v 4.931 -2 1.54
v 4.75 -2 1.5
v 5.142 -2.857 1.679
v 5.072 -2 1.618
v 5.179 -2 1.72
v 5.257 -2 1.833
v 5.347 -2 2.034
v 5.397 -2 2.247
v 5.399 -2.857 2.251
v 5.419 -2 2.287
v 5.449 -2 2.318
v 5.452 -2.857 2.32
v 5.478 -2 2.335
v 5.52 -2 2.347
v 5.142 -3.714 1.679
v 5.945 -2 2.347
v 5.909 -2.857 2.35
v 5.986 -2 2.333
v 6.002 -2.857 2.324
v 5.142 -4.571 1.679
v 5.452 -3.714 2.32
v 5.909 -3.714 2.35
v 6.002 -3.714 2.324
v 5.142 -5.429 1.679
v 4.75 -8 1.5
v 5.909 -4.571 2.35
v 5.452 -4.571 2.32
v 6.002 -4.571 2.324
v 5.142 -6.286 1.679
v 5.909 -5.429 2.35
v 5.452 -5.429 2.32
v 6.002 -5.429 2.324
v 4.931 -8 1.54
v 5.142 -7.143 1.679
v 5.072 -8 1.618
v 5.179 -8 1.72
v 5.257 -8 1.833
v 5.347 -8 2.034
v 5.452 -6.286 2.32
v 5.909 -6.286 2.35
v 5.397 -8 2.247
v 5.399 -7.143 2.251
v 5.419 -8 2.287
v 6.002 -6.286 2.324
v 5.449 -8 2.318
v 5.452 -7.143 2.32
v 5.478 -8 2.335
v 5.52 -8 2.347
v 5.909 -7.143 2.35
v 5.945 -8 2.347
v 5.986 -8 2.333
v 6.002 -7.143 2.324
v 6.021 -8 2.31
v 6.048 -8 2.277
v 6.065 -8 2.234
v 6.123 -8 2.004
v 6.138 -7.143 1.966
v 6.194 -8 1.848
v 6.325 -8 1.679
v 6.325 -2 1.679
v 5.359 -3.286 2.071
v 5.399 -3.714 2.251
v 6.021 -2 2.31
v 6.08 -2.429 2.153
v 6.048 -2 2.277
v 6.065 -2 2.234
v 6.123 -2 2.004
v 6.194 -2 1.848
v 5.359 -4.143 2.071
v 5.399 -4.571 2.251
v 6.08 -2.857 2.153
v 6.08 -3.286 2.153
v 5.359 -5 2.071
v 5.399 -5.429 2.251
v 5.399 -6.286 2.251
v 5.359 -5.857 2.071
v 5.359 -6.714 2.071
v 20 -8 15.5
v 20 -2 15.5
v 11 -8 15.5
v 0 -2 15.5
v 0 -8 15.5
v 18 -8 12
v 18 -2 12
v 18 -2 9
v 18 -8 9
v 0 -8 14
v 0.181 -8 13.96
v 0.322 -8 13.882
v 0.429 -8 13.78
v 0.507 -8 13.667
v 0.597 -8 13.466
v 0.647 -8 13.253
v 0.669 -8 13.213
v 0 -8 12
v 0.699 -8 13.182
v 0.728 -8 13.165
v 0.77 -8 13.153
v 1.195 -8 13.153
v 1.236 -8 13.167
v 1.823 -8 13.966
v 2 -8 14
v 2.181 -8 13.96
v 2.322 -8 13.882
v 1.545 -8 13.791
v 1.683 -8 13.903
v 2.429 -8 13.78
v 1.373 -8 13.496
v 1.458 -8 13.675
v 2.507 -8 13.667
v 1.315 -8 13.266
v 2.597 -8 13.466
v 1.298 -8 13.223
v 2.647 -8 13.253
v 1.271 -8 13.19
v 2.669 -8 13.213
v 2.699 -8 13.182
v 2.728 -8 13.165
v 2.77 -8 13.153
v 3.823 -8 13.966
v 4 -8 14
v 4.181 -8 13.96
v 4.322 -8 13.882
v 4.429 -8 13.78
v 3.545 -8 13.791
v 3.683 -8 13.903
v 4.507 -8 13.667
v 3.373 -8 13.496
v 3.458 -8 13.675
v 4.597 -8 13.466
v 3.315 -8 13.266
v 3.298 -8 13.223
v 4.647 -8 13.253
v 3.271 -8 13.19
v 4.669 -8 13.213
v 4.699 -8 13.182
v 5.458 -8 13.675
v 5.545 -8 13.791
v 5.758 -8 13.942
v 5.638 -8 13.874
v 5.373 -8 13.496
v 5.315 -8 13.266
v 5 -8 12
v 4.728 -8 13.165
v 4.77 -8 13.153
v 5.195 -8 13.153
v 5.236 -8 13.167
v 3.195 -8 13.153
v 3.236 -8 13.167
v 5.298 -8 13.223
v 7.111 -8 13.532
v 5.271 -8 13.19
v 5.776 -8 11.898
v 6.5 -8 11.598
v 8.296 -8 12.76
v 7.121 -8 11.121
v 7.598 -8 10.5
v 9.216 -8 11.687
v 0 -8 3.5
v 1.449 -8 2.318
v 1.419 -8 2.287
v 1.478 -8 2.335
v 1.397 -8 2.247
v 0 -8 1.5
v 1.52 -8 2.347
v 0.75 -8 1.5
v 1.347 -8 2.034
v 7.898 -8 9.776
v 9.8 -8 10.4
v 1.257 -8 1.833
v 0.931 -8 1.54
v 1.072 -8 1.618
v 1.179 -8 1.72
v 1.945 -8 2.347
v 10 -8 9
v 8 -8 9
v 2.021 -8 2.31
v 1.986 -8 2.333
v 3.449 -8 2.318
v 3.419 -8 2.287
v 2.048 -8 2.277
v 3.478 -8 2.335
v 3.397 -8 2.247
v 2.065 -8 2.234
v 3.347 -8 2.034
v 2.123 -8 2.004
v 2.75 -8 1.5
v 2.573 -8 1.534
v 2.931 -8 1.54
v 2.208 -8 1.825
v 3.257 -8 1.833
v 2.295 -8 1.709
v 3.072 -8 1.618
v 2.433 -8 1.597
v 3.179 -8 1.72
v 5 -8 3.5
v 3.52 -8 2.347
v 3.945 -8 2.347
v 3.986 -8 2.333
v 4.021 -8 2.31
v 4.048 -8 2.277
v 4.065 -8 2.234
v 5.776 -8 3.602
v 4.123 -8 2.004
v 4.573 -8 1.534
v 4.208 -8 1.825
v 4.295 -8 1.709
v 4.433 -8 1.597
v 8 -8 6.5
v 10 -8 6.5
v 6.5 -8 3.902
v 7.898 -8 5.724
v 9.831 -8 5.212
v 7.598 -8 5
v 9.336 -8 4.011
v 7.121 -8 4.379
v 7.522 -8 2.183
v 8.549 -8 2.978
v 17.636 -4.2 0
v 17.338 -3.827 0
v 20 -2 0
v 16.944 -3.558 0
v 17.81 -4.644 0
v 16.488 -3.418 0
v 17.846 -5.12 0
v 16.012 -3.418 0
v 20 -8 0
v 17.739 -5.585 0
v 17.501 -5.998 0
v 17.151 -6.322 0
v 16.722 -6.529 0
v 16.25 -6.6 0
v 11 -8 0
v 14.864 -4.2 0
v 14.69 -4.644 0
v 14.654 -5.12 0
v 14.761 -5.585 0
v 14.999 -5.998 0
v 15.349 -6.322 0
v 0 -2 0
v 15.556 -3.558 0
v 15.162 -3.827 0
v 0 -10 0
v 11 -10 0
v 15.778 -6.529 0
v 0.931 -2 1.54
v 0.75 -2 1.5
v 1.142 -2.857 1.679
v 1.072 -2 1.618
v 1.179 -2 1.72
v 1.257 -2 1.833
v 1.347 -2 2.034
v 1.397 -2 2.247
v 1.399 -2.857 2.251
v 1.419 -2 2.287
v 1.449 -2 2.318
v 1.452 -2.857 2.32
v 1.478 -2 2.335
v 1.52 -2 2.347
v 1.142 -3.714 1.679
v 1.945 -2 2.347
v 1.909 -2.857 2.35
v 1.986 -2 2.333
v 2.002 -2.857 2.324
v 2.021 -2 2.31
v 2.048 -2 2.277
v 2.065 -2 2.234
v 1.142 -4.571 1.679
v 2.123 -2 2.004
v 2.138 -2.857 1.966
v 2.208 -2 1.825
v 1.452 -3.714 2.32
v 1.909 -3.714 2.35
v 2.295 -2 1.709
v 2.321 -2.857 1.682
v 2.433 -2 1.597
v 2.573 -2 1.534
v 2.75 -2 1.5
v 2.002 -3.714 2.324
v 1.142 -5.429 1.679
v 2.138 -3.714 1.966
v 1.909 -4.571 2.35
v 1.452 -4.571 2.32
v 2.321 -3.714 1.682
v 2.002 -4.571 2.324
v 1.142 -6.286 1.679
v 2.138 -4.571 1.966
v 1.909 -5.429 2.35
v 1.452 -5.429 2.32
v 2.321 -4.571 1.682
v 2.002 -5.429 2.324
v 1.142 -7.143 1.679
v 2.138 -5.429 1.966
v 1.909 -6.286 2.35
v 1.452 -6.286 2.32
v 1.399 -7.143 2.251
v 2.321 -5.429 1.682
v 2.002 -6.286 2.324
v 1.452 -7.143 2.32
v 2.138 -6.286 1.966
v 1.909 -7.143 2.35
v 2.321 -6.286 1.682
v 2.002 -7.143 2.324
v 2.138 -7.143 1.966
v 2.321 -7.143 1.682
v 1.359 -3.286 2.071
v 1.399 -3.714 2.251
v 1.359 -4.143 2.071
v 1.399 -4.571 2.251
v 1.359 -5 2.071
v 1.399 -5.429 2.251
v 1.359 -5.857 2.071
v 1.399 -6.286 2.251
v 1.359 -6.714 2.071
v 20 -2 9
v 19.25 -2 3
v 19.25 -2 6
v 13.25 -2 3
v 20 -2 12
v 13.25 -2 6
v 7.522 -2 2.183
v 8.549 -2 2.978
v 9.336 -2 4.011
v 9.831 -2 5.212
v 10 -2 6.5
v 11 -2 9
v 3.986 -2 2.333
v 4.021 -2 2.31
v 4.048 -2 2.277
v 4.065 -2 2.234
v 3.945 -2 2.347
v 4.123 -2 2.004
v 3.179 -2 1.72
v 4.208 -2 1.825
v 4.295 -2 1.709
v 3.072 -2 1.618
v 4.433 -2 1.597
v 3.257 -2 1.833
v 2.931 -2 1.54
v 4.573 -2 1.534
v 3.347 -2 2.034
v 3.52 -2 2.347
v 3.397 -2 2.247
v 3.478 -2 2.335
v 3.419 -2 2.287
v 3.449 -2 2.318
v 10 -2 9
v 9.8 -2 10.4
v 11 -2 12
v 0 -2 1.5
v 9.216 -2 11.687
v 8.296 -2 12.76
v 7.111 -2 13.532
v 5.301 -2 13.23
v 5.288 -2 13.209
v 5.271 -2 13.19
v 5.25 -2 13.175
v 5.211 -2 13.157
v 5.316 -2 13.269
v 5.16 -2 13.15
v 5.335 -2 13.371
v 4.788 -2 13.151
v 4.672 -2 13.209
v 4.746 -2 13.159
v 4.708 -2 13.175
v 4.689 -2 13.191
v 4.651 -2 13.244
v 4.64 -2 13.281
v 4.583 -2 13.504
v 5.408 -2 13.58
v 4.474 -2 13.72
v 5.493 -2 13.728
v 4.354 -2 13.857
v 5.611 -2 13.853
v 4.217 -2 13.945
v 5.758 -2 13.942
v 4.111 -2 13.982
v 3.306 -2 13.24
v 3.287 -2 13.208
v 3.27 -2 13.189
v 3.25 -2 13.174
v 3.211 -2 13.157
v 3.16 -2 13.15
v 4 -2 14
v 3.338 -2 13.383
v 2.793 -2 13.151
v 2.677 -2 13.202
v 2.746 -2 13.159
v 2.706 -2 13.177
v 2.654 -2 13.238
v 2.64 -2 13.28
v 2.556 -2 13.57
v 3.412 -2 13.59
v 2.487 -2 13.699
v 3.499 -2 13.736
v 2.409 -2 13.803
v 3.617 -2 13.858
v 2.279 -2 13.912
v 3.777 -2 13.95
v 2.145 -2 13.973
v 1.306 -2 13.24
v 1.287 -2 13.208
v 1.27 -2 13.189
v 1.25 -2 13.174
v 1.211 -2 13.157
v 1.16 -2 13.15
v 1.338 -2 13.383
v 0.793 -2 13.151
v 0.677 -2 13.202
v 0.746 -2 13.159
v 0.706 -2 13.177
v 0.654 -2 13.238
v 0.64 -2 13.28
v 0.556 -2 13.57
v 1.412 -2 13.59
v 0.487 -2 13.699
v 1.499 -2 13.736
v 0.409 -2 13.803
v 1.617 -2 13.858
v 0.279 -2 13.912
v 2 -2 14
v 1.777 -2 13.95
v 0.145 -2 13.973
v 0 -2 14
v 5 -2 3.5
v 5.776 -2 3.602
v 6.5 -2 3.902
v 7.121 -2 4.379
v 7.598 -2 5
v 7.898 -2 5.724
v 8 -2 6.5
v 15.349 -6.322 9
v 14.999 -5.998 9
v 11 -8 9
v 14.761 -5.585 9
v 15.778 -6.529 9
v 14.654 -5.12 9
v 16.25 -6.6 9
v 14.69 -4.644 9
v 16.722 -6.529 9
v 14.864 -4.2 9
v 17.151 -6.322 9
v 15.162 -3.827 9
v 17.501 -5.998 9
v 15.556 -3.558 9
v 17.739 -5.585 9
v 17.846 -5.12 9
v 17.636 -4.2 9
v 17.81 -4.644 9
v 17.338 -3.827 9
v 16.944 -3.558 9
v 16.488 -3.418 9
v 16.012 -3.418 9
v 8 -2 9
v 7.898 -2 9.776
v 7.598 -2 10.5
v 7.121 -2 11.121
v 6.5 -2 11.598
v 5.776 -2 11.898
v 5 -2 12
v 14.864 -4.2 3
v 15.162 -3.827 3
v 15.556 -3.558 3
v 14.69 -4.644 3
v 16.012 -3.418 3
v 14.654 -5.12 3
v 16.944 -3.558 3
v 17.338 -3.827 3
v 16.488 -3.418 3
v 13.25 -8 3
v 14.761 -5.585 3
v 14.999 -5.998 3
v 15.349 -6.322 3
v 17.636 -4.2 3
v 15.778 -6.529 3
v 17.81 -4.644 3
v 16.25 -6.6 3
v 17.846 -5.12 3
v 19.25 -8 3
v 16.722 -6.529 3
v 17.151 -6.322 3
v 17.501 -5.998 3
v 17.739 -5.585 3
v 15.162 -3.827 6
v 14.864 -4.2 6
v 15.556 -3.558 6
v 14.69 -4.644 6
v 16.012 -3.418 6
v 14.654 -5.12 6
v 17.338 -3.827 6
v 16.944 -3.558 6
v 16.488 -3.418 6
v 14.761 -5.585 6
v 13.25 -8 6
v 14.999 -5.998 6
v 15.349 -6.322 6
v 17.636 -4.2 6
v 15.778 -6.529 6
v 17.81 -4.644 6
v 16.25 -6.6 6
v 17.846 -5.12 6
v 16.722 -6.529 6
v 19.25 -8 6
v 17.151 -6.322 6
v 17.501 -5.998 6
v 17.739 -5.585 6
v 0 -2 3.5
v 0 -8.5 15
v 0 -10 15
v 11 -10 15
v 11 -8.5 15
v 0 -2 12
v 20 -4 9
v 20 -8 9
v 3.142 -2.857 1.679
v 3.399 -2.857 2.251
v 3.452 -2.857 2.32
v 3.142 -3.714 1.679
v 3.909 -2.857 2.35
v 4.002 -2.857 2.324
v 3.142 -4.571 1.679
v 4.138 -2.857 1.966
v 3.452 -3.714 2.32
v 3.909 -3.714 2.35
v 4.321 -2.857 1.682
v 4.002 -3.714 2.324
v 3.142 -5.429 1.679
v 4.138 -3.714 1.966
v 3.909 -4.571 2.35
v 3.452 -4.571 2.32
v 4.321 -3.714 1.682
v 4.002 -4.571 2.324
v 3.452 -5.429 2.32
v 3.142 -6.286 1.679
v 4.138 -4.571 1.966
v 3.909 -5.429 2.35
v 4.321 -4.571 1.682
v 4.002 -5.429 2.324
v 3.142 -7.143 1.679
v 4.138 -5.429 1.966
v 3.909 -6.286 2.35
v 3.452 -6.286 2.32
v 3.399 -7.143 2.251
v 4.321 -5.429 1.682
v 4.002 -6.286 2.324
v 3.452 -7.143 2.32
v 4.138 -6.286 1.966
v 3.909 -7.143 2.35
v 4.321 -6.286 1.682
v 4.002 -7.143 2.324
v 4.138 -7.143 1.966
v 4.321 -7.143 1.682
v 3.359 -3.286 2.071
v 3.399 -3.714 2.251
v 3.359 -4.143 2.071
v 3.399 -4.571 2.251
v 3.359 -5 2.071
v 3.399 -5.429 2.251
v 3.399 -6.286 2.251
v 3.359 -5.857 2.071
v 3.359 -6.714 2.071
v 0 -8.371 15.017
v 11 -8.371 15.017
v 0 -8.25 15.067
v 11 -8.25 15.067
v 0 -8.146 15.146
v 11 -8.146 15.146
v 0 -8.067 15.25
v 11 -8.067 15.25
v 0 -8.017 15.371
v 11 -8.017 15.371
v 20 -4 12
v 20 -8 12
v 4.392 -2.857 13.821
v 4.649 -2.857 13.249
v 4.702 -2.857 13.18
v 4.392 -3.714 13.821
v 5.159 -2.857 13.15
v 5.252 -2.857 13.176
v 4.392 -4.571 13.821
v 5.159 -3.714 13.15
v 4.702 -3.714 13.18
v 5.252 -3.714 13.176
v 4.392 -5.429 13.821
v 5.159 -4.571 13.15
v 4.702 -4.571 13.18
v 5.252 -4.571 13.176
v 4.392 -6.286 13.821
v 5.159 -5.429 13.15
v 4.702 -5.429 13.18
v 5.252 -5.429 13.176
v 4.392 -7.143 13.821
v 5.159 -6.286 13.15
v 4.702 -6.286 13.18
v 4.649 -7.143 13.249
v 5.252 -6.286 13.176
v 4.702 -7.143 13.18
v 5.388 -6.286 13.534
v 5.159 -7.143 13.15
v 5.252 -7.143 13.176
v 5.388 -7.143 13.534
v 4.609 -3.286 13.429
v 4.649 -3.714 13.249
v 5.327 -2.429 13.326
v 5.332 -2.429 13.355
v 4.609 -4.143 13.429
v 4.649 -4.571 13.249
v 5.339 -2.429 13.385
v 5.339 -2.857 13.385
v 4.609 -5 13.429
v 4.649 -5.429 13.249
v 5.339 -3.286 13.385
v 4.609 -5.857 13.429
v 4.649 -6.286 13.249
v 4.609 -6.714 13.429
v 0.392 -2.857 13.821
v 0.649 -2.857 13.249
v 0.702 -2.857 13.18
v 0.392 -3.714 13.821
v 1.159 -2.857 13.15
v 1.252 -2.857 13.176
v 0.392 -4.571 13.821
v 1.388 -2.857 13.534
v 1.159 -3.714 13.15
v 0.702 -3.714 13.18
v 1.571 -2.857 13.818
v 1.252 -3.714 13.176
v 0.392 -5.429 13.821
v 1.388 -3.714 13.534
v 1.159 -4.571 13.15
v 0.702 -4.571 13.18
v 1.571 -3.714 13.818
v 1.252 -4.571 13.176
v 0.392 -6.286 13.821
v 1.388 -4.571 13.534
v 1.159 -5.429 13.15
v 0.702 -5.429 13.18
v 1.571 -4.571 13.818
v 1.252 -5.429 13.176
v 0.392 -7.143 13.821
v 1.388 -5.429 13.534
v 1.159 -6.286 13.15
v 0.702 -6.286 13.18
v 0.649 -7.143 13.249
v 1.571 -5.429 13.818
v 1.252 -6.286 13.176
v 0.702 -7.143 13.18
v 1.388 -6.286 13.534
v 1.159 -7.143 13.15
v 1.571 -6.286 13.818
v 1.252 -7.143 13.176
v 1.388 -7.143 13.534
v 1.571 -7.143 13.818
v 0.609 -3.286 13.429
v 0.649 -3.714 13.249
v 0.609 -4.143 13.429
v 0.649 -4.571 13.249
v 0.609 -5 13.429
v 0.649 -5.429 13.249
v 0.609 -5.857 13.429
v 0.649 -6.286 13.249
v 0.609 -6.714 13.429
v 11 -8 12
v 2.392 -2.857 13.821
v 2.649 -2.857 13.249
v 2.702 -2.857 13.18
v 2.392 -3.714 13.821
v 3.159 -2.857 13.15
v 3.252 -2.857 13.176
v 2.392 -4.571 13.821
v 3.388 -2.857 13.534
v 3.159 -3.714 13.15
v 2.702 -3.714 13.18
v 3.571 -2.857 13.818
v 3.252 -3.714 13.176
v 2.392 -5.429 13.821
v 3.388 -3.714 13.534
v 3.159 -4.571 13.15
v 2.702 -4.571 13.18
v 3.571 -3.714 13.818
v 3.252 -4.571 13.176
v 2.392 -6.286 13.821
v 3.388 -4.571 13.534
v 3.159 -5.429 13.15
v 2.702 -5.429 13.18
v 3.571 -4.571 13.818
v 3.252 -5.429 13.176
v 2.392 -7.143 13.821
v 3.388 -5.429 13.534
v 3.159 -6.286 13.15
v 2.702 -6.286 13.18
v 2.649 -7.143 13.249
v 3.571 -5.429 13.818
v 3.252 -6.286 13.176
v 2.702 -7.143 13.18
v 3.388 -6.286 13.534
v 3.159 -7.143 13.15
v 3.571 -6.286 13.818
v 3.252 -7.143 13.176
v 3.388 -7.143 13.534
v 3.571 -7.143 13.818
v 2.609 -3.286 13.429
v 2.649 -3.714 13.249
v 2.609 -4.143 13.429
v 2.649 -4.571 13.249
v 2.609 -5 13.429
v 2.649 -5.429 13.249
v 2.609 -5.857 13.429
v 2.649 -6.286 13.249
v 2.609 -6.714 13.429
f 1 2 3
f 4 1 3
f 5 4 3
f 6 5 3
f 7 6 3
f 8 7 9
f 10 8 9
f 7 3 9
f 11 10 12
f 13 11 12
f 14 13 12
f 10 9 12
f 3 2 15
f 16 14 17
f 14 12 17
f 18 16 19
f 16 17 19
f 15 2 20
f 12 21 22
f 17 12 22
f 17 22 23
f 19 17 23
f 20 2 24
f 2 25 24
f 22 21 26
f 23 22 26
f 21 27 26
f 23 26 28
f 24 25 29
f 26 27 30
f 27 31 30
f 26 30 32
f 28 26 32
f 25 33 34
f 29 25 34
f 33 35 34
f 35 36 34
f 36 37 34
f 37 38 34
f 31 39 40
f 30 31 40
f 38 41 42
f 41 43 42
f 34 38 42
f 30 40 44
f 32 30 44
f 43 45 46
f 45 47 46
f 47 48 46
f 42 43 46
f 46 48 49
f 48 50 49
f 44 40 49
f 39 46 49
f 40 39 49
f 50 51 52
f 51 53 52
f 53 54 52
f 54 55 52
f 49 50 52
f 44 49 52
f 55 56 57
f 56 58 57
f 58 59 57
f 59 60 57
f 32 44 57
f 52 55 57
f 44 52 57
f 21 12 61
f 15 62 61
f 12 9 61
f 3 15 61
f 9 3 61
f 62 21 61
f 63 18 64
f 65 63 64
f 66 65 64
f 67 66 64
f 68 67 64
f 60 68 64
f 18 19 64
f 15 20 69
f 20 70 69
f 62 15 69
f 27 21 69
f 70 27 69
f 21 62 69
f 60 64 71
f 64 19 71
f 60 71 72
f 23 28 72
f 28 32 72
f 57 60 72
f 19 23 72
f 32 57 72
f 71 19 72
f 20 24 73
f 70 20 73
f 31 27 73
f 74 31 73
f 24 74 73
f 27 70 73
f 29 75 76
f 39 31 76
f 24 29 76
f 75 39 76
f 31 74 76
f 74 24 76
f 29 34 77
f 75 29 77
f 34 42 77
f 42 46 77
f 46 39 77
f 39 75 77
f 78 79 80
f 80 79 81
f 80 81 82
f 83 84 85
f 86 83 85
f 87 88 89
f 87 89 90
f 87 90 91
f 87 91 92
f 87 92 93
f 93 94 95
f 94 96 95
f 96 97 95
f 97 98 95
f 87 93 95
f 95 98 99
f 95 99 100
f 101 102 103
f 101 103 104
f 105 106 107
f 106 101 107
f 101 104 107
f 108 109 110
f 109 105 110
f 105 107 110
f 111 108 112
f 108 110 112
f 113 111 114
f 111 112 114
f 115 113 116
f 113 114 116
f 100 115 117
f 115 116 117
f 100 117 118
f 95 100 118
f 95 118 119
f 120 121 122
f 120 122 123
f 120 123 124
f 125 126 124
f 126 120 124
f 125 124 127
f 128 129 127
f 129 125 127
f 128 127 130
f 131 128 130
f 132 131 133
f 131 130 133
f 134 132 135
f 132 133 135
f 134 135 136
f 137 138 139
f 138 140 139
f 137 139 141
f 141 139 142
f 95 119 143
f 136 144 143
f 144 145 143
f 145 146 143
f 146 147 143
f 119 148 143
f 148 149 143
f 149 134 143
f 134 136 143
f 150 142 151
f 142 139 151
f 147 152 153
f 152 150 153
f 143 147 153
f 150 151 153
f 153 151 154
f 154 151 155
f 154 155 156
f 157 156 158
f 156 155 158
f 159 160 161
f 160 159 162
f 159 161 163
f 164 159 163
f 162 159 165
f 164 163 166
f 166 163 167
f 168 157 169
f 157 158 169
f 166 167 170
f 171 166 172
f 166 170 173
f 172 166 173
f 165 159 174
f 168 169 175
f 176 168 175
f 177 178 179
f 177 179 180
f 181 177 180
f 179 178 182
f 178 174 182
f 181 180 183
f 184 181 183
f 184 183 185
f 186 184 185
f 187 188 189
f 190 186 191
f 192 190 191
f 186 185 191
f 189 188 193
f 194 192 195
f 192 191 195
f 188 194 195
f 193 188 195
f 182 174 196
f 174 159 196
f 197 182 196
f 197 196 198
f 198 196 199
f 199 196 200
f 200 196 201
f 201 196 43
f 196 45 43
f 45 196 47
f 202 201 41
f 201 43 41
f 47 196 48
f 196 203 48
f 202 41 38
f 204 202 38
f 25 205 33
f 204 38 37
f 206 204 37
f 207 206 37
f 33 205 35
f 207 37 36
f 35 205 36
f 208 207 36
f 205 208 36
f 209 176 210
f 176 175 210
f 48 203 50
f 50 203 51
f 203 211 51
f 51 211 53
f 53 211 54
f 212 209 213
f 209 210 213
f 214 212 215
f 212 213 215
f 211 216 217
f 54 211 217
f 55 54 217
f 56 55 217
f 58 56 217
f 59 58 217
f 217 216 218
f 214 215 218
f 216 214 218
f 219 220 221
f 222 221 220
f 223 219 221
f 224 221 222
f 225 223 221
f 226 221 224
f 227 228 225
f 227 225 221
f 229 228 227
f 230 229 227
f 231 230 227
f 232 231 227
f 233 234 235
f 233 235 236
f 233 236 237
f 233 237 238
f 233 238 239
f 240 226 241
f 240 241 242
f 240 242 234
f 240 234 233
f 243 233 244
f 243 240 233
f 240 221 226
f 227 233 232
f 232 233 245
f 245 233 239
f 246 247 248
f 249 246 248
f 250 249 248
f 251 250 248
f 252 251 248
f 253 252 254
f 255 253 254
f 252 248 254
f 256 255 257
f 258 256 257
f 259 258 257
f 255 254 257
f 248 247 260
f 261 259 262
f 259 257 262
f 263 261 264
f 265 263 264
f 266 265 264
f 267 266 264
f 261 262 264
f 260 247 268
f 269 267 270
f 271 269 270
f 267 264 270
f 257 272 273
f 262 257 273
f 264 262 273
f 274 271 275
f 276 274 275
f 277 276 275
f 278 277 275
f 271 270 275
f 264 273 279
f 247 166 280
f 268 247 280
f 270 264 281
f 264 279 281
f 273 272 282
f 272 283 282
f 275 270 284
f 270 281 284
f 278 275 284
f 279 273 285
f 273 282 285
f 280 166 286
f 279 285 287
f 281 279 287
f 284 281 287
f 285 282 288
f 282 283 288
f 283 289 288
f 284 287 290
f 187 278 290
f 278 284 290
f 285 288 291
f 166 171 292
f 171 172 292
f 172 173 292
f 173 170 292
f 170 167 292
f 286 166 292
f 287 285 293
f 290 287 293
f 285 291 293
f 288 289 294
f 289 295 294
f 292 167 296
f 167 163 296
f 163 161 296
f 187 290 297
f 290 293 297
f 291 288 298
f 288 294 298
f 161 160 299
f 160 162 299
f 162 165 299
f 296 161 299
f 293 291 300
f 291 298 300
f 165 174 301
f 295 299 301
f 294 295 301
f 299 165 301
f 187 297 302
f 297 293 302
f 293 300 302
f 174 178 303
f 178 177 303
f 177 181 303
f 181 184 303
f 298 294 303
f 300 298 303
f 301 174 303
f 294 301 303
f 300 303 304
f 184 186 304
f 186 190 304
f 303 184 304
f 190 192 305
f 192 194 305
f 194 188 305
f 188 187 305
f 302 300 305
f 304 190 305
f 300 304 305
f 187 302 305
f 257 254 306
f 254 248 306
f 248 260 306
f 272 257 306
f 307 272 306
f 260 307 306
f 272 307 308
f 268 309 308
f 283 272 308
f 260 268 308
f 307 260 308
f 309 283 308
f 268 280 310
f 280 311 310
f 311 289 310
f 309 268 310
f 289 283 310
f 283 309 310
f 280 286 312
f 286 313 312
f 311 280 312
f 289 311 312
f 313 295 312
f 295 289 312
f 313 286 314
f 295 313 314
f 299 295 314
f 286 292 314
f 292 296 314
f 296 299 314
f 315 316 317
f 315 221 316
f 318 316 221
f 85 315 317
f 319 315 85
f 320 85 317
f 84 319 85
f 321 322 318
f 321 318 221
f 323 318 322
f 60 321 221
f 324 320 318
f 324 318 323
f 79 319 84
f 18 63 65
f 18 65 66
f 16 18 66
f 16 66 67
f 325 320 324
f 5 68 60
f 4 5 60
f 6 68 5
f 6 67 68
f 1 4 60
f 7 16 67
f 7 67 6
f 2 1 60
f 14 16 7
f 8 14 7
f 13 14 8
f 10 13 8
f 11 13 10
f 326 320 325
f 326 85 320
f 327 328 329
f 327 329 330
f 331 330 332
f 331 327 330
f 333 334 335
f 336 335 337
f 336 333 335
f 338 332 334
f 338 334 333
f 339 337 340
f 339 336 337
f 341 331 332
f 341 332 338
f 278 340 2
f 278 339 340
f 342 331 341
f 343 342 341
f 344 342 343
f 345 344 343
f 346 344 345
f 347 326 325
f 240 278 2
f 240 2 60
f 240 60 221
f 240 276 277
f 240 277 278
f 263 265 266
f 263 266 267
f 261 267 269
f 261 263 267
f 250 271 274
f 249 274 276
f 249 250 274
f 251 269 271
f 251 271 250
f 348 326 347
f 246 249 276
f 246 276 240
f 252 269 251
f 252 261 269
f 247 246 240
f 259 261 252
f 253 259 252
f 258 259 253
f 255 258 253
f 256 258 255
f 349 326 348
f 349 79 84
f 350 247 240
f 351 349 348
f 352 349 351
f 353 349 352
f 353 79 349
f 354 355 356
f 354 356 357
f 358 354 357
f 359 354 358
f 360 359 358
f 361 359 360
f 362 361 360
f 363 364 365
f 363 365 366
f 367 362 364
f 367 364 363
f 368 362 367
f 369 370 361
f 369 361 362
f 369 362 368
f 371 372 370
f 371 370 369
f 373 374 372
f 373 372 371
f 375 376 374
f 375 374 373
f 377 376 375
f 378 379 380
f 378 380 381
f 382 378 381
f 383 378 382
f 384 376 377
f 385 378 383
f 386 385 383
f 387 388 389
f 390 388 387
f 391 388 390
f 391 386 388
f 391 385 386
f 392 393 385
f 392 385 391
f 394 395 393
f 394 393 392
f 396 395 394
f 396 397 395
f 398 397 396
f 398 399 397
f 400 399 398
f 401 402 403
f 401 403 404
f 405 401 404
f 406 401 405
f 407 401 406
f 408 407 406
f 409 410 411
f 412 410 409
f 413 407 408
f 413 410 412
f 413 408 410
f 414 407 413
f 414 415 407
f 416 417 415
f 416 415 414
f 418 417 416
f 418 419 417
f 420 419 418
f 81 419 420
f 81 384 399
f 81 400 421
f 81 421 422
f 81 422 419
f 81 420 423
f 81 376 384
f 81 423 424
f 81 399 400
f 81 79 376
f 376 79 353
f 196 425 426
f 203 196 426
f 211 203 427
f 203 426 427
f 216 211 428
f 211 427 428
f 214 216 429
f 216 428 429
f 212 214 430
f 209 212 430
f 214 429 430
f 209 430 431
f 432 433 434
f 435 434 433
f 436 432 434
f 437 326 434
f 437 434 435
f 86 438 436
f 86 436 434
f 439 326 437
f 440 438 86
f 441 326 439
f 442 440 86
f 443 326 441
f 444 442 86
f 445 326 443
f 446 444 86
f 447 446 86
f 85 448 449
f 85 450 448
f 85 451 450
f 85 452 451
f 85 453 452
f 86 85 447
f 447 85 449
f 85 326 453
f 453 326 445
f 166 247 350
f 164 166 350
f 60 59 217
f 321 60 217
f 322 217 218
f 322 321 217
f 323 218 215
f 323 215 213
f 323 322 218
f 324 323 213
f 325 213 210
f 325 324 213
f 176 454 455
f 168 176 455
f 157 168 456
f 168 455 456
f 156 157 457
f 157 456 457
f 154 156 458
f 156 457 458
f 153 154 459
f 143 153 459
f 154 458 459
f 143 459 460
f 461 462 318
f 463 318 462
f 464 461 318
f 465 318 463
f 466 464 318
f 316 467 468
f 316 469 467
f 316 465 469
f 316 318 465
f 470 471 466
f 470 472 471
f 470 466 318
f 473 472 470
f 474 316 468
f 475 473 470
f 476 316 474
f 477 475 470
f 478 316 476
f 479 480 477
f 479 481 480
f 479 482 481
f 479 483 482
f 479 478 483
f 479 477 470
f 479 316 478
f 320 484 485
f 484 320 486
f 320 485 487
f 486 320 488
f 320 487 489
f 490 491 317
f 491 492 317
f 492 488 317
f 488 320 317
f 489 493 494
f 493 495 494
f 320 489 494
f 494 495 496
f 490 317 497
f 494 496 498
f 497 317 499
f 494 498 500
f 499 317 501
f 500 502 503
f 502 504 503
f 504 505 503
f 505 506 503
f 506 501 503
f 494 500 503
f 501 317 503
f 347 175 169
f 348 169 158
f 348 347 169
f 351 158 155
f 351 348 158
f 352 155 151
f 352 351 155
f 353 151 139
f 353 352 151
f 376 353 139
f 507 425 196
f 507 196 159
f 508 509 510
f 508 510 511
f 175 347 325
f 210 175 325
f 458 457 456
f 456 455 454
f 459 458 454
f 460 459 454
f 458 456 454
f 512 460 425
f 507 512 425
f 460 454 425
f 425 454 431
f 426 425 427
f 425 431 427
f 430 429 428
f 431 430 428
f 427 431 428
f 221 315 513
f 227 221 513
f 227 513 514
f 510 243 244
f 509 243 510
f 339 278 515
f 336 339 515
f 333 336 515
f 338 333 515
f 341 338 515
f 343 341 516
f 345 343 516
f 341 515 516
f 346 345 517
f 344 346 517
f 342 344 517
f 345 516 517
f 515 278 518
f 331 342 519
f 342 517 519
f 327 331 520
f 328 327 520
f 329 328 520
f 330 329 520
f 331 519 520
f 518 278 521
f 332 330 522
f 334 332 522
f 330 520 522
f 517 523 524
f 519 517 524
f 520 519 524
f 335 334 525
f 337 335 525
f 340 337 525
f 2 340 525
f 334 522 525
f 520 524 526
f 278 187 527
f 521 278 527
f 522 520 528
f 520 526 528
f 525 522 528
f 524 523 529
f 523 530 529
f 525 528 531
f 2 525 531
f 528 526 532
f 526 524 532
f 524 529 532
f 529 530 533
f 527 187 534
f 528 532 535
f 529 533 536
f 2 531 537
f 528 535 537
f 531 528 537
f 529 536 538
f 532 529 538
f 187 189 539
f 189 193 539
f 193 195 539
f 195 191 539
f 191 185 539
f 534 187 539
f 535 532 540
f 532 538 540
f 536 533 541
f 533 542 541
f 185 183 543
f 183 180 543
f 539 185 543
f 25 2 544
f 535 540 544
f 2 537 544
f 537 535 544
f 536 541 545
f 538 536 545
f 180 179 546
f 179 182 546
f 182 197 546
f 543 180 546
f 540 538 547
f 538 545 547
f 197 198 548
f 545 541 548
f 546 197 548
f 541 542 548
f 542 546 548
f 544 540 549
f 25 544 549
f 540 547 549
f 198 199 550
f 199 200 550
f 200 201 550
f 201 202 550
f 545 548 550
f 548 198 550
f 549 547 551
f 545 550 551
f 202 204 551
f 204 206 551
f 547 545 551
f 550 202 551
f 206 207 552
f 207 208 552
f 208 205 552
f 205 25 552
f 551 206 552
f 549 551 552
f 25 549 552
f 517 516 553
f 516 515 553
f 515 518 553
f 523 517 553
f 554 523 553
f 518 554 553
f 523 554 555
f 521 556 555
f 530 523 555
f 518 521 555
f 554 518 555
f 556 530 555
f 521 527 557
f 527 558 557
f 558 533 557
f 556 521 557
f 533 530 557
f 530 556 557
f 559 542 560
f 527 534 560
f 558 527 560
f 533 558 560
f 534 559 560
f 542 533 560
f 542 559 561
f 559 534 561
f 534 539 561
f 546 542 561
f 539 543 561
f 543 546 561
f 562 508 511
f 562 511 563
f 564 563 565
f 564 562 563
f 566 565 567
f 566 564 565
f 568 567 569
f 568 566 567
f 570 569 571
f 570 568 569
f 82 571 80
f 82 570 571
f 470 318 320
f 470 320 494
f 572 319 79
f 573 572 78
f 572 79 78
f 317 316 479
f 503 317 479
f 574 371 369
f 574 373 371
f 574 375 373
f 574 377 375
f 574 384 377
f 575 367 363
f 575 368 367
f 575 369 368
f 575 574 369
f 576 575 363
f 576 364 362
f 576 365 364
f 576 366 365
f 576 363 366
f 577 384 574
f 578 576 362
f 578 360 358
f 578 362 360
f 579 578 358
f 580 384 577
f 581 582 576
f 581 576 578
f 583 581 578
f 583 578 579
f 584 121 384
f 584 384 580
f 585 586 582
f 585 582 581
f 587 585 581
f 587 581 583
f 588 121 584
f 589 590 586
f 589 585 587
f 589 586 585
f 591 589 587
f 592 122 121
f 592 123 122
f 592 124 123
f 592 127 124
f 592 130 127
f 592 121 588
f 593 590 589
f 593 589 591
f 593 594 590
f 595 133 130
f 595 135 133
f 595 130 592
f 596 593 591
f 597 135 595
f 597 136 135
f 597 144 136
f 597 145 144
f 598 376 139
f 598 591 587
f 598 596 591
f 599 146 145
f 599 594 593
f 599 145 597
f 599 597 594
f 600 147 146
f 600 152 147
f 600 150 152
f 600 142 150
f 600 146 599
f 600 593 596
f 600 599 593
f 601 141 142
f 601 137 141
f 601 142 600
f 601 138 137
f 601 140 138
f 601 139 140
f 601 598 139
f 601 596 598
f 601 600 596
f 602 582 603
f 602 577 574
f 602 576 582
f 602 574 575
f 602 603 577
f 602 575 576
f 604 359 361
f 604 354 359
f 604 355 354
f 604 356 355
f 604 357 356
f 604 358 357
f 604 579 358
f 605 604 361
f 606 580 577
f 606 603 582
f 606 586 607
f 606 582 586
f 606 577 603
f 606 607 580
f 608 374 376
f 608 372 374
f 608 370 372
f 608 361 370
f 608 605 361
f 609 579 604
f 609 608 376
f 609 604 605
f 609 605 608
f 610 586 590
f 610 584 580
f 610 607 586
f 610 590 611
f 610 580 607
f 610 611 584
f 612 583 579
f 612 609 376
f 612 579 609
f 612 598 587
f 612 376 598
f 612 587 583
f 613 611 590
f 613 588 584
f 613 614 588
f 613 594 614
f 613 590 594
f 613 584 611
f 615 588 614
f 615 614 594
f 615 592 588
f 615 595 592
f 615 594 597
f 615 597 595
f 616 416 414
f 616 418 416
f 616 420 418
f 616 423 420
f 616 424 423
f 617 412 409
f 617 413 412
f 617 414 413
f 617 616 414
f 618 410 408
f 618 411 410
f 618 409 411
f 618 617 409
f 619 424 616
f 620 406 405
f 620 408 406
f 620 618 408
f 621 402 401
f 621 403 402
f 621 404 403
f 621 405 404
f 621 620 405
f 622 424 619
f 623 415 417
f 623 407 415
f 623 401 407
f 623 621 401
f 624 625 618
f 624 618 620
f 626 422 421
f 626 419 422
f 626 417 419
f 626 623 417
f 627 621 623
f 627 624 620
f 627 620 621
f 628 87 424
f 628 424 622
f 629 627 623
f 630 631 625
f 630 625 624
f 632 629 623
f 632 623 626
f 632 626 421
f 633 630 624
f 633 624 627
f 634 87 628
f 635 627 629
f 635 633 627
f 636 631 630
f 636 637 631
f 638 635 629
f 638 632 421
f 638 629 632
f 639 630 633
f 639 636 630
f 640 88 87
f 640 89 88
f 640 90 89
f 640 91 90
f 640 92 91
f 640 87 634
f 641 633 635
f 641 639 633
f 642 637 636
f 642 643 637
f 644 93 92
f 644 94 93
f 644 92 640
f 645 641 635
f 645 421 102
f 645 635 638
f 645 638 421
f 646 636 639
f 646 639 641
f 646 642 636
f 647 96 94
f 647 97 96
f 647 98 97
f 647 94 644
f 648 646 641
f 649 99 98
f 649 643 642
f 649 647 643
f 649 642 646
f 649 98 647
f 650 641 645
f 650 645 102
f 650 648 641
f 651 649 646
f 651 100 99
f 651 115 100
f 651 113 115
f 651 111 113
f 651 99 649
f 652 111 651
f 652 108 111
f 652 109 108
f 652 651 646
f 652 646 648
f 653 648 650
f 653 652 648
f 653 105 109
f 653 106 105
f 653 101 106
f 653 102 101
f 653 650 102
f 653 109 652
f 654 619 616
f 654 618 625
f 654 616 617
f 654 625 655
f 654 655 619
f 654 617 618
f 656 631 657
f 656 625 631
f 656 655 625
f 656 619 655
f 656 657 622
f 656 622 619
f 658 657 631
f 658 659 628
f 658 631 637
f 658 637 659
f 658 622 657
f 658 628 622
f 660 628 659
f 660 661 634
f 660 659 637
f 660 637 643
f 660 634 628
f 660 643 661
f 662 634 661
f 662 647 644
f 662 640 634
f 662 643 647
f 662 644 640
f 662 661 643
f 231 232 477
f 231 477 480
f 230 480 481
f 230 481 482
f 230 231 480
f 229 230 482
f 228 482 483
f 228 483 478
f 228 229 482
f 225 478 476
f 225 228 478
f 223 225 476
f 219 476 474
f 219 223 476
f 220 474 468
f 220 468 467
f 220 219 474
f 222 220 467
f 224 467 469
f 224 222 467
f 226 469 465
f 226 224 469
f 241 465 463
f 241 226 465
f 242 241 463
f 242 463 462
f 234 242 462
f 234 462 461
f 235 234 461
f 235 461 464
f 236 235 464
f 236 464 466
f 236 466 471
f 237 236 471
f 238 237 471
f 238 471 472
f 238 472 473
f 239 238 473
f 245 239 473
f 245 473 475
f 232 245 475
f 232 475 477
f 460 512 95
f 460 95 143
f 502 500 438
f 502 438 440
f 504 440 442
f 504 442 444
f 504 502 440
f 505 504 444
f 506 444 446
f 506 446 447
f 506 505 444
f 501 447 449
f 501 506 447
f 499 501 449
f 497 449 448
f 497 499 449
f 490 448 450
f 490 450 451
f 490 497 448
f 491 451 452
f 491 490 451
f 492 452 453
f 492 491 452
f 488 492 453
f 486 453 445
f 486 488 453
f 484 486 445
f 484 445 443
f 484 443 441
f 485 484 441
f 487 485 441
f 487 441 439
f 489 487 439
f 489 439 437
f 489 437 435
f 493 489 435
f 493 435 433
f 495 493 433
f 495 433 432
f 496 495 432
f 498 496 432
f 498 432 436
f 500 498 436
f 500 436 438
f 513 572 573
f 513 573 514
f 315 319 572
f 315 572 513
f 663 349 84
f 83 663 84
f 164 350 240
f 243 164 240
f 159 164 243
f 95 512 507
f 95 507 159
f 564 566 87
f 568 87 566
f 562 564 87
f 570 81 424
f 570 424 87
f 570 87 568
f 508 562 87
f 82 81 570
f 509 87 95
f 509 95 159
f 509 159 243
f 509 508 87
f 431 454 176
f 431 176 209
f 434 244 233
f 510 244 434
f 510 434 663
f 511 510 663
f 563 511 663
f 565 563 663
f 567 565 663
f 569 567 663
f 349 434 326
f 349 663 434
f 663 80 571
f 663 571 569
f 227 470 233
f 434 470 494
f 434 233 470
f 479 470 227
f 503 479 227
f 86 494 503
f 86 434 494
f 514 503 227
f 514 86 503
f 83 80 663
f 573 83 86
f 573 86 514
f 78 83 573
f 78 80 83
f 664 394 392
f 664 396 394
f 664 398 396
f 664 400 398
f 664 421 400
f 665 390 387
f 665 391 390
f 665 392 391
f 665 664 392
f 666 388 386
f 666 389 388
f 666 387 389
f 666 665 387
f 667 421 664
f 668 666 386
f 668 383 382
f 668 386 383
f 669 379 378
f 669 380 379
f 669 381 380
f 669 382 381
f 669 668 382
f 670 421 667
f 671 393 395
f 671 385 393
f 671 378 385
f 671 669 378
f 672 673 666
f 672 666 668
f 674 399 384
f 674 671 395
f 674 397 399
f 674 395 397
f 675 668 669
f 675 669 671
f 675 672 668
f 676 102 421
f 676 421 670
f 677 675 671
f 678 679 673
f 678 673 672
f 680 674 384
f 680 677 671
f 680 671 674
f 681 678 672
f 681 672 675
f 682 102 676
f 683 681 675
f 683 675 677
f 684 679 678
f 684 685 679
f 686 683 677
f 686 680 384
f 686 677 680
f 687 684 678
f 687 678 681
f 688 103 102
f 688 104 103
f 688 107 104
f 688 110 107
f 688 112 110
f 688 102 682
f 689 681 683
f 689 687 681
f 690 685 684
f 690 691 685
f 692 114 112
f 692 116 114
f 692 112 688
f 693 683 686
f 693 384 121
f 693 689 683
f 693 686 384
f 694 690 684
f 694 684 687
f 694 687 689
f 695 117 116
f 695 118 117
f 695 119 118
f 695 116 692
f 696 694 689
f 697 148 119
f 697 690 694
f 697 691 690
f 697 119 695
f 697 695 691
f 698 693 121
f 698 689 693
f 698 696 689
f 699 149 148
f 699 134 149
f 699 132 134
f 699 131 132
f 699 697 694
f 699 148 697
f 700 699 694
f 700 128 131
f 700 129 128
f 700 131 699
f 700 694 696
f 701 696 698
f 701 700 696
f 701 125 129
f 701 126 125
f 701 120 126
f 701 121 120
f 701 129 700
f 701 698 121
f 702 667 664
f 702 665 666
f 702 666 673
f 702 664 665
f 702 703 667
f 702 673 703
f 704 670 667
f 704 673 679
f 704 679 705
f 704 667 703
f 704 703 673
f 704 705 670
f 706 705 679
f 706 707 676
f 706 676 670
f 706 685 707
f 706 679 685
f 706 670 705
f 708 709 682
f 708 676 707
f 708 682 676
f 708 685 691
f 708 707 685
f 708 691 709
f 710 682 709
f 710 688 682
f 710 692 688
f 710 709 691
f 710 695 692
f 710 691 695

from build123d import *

# Parameters (mm, degrees)
SKETCH_W        = 10
SKETCH_H        = 15.5
PAD_DEPTH       = 20
POCKET001_DEPTH = 20.001
SKETCH003_W     = 3
SKETCH003_H     = 7
SKETCH003_H_2   = 1.990637
POCKET002_DEPTH = 10.001
SKETCH004_W     = 2
SKETCH004_H     = 9
POCKET003_DEPTH = 15.501
SKETCH005_W     = 2
SKETCH005_H     = 9
POCKET004_DEPTH = 15.501
POCKET005_DEPTH = 8
PAD001_DEPTH    = 8
SKETCH010_R     = 1.6
POCKET006_DEPTH = 10
SKETCH013_W     = 2
SKETCH013_H     = 20
POCKET008_DEPTH = 11.001
SKETCH014_W     = 6
SKETCH014_H     = 6
POCKET009_DEPTH = 3
PAD002_DEPTH    = 6


with BuildPart() as framebase:
    # Sketch → Pad (new body)
    with BuildSketch(Plane.YZ):
        with Locations((5, 7.75)):
            Rectangle(SKETCH_W, SKETCH_H)
    extrude(amount=PAD_DEPTH)

    # Sketch002 (on DatumPlane) → Pocket001 (cut, through all)
    with BuildSketch(Plane(origin=(0, 10, 15.5), x_dir=(0, 1, 0), z_dir=(-1, 0, 0))):
        with BuildLine():
            ThreePointArc((0, -0.5), (0.5, 0), (0, 0.5))
            Line((0, 0.5), (-1.5, 0.5))
            ThreePointArc((-1.5, 0.5), (-2, 0), (-1.5, -0.5))
            Line((0, -0.5), (-1.5, -0.5))
        make_face()
    extrude(amount=-POCKET001_DEPTH, mode=Mode.SUBTRACT)

    # Sketch003 (on DatumPlane) → Pocket002 (cut, through all)
    with BuildSketch(Plane(origin=(20, 0, 15.5), x_dir=(0, 0, -1), z_dir=(0, -1, 0))):
        with Locations((5, -5.5)):
            Rectangle(SKETCH003_W, SKETCH003_H)
        with Locations((5, 0.995318)):
            Rectangle(SKETCH003_W, SKETCH003_H_2)
    extrude(amount=-POCKET002_DEPTH, mode=Mode.SUBTRACT)

    # Sketch004 (on DatumPlane) → Pocket003 (cut, through all)
    with BuildSketch(Plane(origin=(20, 0, 15.5), x_dir=(0, -1, 0), z_dir=(0, 0, 1))):
        with Locations((-1, -4.5)):
            Rectangle(SKETCH004_W, SKETCH004_H)
    extrude(amount=-POCKET003_DEPTH, mode=Mode.SUBTRACT)

    # Sketch005 (on DatumPlane) → Pocket004 (cut, through all)
    with BuildSketch(Plane(origin=(20, 10, 15.5), x_dir=(0, -1, 0), z_dir=(0, 0, 1))):
        with Locations((1, -4.5)):
            Rectangle(SKETCH005_W, SKETCH005_H)
    extrude(amount=-POCKET004_DEPTH, mode=Mode.SUBTRACT)

    # Sketch006 (on DatumPlane) → Pocket005 (cut)
    with BuildSketch(Plane(origin=(0, 0, 15.5), x_dir=(0, 0, -1), z_dir=(0, -1, 0))):
        with BuildLine():
            Line((1.5, 0), (3.5, 0))
            Line((3.5, 0), (3.5, 5))
            ThreePointArc((6.5, 8), (4.37868, 7.12132), (3.5, 5))
            Line((6.5, 8), (9, 8))
            ThreePointArc((12, 5), (11.12132, 7.12132), (9, 8))
            Line((12, 5), (12, 0))
            Line((12, 0), (14, 0))
            Line((14, 5), (14, 0))
            ThreePointArc((14, 5), (12.535534, 8.535534), (9, 10))
            Line((6.5, 10), (9, 10))
            ThreePointArc((6.5, 10), (2.964466, 8.535534), (1.5, 5))
            Line((1.5, 5), (1.5, 0))
        make_face()
    extrude(amount=-POCKET005_DEPTH, mode=Mode.SUBTRACT)

    # Sketch008 (on DatumPlane) → Pad001 (join)
    with BuildSketch(Plane(origin=(0, 8, 14), x_dir=(1, 0, 0), z_dir=(0, -1, 0))):
        with BuildLine():
            add(Edge.make_bspline(
                [(0, 0), (0.35359, -0.026741), (0.649381, -0.565336), (0.617792, -0.761919), (0.721021, -0.848783), (0.871627, -0.848783), (1.086099, -0.848783), (1.231939, -0.850694), (1.339653, -0.771577), (1.309148, -0.564354), (1.603926, -0.032231), (2, 0)],
                knots=[0, 0, 0, 0, 0.142857, 0.285714, 0.428571, 0.428571, 0.571429, 0.571429, 0.714286, 0.857143, 1, 1, 1, 1], degree=3))
            add(Edge.make_bspline(
                [(2, 0), (2.35359, -0.026741), (2.649381, -0.565336), (2.617792, -0.761919), (2.721021, -0.848783), (2.871627, -0.848783), (3.086099, -0.848783), (3.231939, -0.850694), (3.339653, -0.771577), (3.309148, -0.564354), (3.603926, -0.032231), (4, 0)],
                knots=[0, 0, 0, 0, 0.142857, 0.285714, 0.428571, 0.428571, 0.571429, 0.571429, 0.714286, 0.857143, 1, 1, 1, 1], degree=3))
            add(Edge.make_bspline(
                [(4, 0), (4.35359, -0.026741), (4.649381, -0.565336), (4.617792, -0.761919), (4.721021, -0.848783), (4.871627, -0.848783), (5.086099, -0.848783), (5.231939, -0.850694), (5.339653, -0.771577), (5.309148, -0.564354), (5.603926, -0.032231), (6, 0)],
                knots=[0, 0, 0, 0, 0.142857, 0.285714, 0.428571, 0.428571, 0.571429, 0.571429, 0.714286, 0.857143, 1, 1, 1, 1], degree=3))
            Line((6, 0), (6, 1))
            Line((6, 1), (0, 1))
            Line((0, 1), (0, 0))
        make_face()
    extrude(amount=PAD001_DEPTH)

    # Sketch010 (on DatumPlane) → Pocket006 (cut)
    with BuildSketch(Plane(origin=(20, 0, 0), x_dir=(0, 1, 0), z_dir=(0, 0, -1))):
        with Locations((5, -3.75)):
            Circle(SKETCH010_R)
    extrude(amount=-POCKET006_DEPTH, mode=Mode.SUBTRACT)

    # Sketch013 (on DatumPlane) → Pocket008 (cut, through all)
    with BuildSketch(Plane(origin=(11, 2, 15.5), x_dir=(0, -1, 0), z_dir=(1, 0, 0))):
        with Locations((1, 10)):
            Rectangle(SKETCH013_W, SKETCH013_H)
    extrude(amount=-POCKET008_DEPTH, mode=Mode.SUBTRACT)

    # Sketch014 (on DatumPlane) → Pocket009 (cut)
    with BuildSketch(Plane(origin=(20, 0, 3), x_dir=(0, 1, 0), z_dir=(0, 0, -1))):
        with Locations((5, -3.75)):
            Rectangle(SKETCH014_W, SKETCH014_H)
    extrude(amount=-POCKET009_DEPTH, mode=Mode.SUBTRACT)

    # Sketch012 (on DatumPlane) → Pad002 (join)
    with BuildSketch(Plane(origin=(0, 8, 1.5), x_dir=(1, 0, 0), z_dir=(0, -1, 0))):
        with BuildLine():
            add(Edge.make_bspline(
                [(0.75, 0), (1.10359, 0.026741), (1.399381, 0.565336), (1.367792, 0.761919), (1.471021, 0.848783), (1.621627, 0.848783), (1.836099, 0.848783), (1.981939, 0.850694), (2.089653, 0.771577), (2.059148, 0.564354), (2.353926, 0.032231), (2.75, 0)],
                knots=[0, 0, 0, 0, 0.142857, 0.285714, 0.428571, 0.428571, 0.571429, 0.571429, 0.714286, 0.857143, 1, 1, 1, 1], degree=3))
            Line((0.75, 0), (0, 0))
            Line((0, 0), (0, -1))
            Line((0, -1), (6.75, -1))
            Line((6.75, -1), (6.75, 0))
            add(Edge.make_bspline(
                [(4.75, 0), (5.10359, 0.026741), (5.399381, 0.565336), (5.367792, 0.761919), (5.471021, 0.848783), (5.621627, 0.848783), (5.836099, 0.848783), (5.981939, 0.850694), (6.089653, 0.771577), (6.059148, 0.564354), (6.353926, 0.032231), (6.75, 0)],
                knots=[0, 0, 0, 0, 0.142857, 0.285714, 0.428571, 0.428571, 0.571429, 0.571429, 0.714286, 0.857143, 1, 1, 1, 1], degree=3))
            add(Edge.make_bspline(
                [(2.75, 0), (3.10359, 0.026741), (3.399381, 0.565336), (3.367792, 0.761919), (3.471021, 0.848783), (3.621627, 0.848783), (3.836099, 0.848783), (3.981939, 0.850694), (4.089653, 0.771577), (4.059148, 0.564354), (4.353926, 0.032231), (4.75, 0)],
                knots=[0, 0, 0, 0, 0.142857, 0.285714, 0.428571, 0.428571, 0.571429, 0.571429, 0.714286, 0.857143, 1, 1, 1, 1], degree=3))
        make_face()
    extrude(amount=PAD002_DEPTH)


with BuildPart() as framebase_front_mirror:
    # Part__Mirroring: instance of FrameBase
    add(framebase.part.mirror(Plane(origin=(0, 0, 0), x_dir=(1, 0, 0), z_dir=(0, 1, 0))))


solid = framebase_front_mirror.part
